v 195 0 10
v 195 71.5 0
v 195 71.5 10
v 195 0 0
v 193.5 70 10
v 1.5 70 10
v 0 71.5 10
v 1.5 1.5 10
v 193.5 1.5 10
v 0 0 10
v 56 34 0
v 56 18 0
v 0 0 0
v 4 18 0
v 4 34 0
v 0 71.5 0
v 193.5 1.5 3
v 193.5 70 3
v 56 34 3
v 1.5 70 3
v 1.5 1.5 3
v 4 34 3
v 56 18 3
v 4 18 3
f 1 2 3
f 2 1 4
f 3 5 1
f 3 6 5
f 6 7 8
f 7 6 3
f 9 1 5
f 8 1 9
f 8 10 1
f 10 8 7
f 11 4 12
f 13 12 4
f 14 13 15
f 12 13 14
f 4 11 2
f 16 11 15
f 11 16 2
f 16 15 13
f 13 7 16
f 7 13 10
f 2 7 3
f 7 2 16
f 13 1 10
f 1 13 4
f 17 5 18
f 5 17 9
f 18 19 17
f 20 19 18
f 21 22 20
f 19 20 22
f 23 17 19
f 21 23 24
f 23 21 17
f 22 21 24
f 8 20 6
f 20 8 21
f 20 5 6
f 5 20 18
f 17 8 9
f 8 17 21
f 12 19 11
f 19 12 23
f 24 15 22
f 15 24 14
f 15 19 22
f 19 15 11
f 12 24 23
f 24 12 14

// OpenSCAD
cap_w = 19;
switch_w = 14;
kb_l = cap_w * 10 + (cap_w - switch_w);
kb_w = cap_w * 3.5 + (cap_w - switch_w);
kb_h = 10;
thickness = 3;
batt_w = 14 + 2;
batt_l = 50 + 2;
batt_x = 4;
batt_y = 18;

difference() {
  // keyboard shell
  cube([kb_l, kb_w, kb_h]);

  // make the keyboard shell hollow
  translate([thickness / 2, thickness / 2, thickness]) {
    cube([kb_l - thickness, kb_w - thickness, kb_h - thickness]);
  }

  // battery door
  translate([batt_x, batt_y, 0]) {
    cube([batt_l, batt_w, thickness]);
  }
}
